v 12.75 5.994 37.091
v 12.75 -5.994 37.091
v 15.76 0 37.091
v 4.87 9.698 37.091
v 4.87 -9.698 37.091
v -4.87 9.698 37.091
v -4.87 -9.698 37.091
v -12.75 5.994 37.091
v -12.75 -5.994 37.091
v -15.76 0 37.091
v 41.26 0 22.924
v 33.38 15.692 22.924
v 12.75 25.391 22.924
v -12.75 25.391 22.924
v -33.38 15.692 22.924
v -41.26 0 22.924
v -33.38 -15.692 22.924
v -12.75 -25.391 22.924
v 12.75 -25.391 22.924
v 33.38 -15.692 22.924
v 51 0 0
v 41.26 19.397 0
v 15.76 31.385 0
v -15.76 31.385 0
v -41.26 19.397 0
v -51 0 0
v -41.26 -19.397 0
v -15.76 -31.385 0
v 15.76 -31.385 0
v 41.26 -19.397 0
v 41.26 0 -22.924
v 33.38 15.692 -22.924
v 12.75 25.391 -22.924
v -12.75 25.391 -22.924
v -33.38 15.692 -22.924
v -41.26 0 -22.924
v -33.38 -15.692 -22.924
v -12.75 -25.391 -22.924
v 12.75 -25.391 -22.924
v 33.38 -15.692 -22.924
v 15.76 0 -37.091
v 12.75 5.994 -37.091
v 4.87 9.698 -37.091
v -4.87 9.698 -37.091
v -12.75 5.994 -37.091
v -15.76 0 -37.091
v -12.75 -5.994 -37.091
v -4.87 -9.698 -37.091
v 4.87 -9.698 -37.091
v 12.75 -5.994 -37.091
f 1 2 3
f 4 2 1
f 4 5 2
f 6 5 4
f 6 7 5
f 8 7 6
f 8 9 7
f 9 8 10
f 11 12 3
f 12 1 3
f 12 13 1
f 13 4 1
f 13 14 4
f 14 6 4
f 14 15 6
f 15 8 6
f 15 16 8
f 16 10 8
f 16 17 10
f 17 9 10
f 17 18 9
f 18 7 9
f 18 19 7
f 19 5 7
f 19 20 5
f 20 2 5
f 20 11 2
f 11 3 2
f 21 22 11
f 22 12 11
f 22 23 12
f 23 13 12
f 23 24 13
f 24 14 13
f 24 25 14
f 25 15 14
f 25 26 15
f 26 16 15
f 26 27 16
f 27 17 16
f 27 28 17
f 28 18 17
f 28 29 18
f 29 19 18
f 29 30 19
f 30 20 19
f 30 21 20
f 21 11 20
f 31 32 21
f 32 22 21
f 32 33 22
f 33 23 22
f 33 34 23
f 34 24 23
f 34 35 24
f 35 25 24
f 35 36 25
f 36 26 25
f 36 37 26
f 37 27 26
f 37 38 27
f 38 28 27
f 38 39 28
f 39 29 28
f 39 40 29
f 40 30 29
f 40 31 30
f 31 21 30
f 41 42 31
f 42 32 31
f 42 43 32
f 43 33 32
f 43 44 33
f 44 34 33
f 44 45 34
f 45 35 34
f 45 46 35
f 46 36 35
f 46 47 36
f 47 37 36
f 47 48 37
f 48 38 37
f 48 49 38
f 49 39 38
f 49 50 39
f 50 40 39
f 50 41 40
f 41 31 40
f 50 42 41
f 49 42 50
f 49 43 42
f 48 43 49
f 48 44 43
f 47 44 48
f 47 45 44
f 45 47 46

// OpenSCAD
// Generated by SolidPython 1.0.1 on 2020-07-29 00:46:53


scale(v = [17, 11, 13]) {
	sphere(r = 3);
}
/***********************************************
*********      SolidPython code:      **********
************************************************
 
# import packages: SolidPython
from solid import *
from solid.utils import *
from itertools import chain, combinations, permutations


class Resize:

    def __init__(self, scad_file):
        self.scad_file = scad_file
        #self.scad_file = import_scad(scad_file)
        # cone/cylinder param:
        self.r1 = 0
        self.r2 = 0
        self.h = 0
        # rectangular prism param:
        self.w = 0
        self.l = 0
        # ellipse param:
        self.r = 0

    # import OpenScad code (file name corresponds to shape)


    # classify shape + parameters
    def assign(self, param1, param2, param3):
        if self.scad_file == 'cone.scad':
            self.r1 = param1
            self.r2 = param2
            self.h = param3
        elif self.scad_file == 'cylinder.scad':
            self.r1 = param1
            self.r2 = param2
            self.h = param3
        elif self.scad_file == 'rectangularPrism.scad':
            self.h = param1
            self.l = param2
            self.w = param3
        else:
            self.r = param1
            self.h = param2

    # resize parameters
    def iterate(self):
        x = range(3, 20, 2)
        i = 1
        if self.scad_file == 'cone.scad':
            tempList = list(permutations(x, 2))
            for temp in tempList:
                param1 = temp[0]
                param2 = temp[1]
                filepath = 'produced_scad_files/' + 'cone' + str(param1) + '_' + str(param2) + '_' + '.scad'
                scad_render_to_file(cylinder(h=param1, r1=param2, r2=0), filepath)

        elif self.scad_file == 'cylinder.scad':
            tempList = list(permutations(x, 3))
            for temp in tempList:
                param1 = temp[0]
                param2 = temp[1]
                filepath = 'produced_scad_files/' + 'cylinder' + str(param1) + '_' + str(param2) + '_' + '.scad'
                scad_render_to_file(cylinder(h=param1, r1=param2, r2=param2), filepath)

        elif self.scad_file == 'rectangularPrism.scad':
            tempList = list(permutations(x, 3))
            for temp in tempList:
                param1 = temp[0]
                param2 = temp[1]
                param3 = temp[2]
                filepath = 'produced_scad_files/' + 'rectangularPrism' + str(param1) + '_' + str(param2) + '_' + str(
                    param3) + '.scad'
                scad_render_to_file(cube(size=(param1, param2, param3)), filepath)

        elif self.scad_file == 'ellipse.scad':
            tempList = list(permutations(x, 4))
            for temp in tempList:
                param1 = temp[0]
                param2 = temp[1]
                param3 = temp[2]
                param4 = temp[3]
                filepath = 'produced_scad_files/' + 'ellipse' + str(param1) + '_' + str(param2) + '_' + str(param3) + '_' + str(param4) + '.scad'
                scad_render_to_file(scale([param1, param2, param3])(sphere(r=param4)), filepath)

    def render_to_scadfile(self):
        scad_render_to_file(scad, 'example.scad') 
 
************************************************/
